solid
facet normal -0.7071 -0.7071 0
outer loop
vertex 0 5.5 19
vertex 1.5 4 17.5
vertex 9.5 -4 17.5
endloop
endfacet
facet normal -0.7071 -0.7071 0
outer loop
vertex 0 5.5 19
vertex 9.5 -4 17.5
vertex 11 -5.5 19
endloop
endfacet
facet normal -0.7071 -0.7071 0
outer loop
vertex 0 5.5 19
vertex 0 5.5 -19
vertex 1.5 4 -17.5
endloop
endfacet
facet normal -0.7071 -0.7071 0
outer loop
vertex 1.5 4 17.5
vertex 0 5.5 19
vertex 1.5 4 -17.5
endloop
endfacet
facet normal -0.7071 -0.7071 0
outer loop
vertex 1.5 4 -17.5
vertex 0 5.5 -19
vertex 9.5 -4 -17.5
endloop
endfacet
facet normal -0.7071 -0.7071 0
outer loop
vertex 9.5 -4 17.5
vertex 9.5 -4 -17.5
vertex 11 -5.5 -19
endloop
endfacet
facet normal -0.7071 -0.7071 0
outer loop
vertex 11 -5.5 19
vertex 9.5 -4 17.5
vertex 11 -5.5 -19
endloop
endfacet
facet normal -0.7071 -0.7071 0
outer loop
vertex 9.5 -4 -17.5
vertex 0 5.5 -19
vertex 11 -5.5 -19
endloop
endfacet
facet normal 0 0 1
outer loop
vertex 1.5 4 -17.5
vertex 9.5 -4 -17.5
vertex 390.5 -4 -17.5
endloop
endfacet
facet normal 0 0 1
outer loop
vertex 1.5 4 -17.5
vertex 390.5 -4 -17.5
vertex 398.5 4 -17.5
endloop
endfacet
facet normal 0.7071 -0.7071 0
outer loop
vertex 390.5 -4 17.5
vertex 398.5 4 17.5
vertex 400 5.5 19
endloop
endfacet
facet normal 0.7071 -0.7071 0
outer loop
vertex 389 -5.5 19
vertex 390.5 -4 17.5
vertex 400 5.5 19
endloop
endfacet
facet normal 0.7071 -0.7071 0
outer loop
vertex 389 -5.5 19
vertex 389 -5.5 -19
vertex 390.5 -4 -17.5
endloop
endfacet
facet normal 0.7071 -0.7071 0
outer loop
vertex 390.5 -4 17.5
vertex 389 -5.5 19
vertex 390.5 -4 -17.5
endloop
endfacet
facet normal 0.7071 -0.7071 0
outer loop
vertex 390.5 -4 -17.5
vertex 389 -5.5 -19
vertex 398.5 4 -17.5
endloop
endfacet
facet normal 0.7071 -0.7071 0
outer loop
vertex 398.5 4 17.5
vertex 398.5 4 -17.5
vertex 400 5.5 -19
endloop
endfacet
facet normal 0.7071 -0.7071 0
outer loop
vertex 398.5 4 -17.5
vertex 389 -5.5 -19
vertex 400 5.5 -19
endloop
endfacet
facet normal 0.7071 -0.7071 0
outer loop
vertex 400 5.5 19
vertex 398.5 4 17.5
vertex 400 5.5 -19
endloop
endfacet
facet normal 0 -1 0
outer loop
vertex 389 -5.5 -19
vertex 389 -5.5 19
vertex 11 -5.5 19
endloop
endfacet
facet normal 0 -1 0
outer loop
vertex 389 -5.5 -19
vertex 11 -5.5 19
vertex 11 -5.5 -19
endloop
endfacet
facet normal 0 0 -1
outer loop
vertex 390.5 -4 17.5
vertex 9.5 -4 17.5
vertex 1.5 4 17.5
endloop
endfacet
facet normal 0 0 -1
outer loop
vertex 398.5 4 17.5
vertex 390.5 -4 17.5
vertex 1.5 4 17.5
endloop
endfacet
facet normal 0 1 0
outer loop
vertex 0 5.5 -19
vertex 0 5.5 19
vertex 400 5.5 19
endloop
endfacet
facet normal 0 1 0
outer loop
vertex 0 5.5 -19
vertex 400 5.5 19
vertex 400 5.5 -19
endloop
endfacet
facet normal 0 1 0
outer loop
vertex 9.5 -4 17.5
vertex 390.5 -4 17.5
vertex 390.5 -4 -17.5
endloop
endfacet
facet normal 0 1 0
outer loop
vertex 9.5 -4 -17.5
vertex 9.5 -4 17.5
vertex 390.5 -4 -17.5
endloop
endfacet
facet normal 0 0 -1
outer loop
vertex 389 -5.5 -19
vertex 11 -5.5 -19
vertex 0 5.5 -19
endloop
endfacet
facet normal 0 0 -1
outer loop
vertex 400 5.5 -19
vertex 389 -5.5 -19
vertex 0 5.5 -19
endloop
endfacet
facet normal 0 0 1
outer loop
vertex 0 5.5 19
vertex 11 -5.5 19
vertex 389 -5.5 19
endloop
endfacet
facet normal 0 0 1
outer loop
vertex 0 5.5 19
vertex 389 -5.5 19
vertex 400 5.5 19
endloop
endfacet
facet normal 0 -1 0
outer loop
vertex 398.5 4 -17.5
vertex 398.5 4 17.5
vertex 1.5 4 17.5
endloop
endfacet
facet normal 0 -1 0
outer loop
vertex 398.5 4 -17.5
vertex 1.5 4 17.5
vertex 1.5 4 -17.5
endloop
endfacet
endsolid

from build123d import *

# Parameters (mm, degrees)
SKETCH1_W               = 38
SKETCH1_H               = 11
SKETCH1_W_2             = 35
SKETCH1_H_2             = 8
BOSS_EXTRUDE1_DEPTH     = 400
CUT_EXTRUDE1_DEPTH      = 1
CUT_EXTRUDE1_DEPTH_BACK = 39
CUT_EXTRUDE3_DEPTH      = 1
CUT_EXTRUDE3_DEPTH_BACK = 39


with BuildPart() as part:
    # Sketch1 → Boss-Extrude1 (new body)
    with BuildSketch(Plane(origin=(0, 0, 0), x_dir=(0, 0, -1), z_dir=(1, 0, 0))):
        Rectangle(SKETCH1_W, SKETCH1_H)
        Rectangle(SKETCH1_W_2, SKETCH1_H_2, mode=Mode.SUBTRACT)
    extrude(amount=BOSS_EXTRUDE1_DEPTH)

    # Sketch2 → Cut-Extrude1 (cut, two sides)
    with BuildSketch(Plane(origin=(0, 0, -19), x_dir=(-1, 0, 0), z_dir=(0, 0, -1))) as cut_extrude1_sk:
        Polygon((572.970352137, 578.470352137), (0, 5.5), (-11, -5.5), (-583.970352137, -578.470352137), (561.970352137, -1724.411056412), (1718.911056412, -567.470352137), align=None)
    extrude(amount=CUT_EXTRUDE1_DEPTH, mode=Mode.SUBTRACT)
    extrude(cut_extrude1_sk.sketch, amount=-CUT_EXTRUDE1_DEPTH_BACK, mode=Mode.SUBTRACT)

    # Sketch3 → Cut-Extrude3 (cut, two sides)
    with BuildSketch(Plane(origin=(0, 0, -19), x_dir=(-1, 0, 0), z_dir=(0, 0, -1))) as cut_extrude3_sk:
        Polygon((-972.970352137, 578.470352137), (-400, 5.5), (-389, -5.5), (183.970352137, -578.470352137), (-961.970352137, -1724.411056412), (-2118.911056412, -567.470352137), align=None)
    extrude(amount=CUT_EXTRUDE3_DEPTH, mode=Mode.SUBTRACT)
    extrude(cut_extrude3_sk.sketch, amount=-CUT_EXTRUDE3_DEPTH_BACK, mode=Mode.SUBTRACT)


solid = part.part
